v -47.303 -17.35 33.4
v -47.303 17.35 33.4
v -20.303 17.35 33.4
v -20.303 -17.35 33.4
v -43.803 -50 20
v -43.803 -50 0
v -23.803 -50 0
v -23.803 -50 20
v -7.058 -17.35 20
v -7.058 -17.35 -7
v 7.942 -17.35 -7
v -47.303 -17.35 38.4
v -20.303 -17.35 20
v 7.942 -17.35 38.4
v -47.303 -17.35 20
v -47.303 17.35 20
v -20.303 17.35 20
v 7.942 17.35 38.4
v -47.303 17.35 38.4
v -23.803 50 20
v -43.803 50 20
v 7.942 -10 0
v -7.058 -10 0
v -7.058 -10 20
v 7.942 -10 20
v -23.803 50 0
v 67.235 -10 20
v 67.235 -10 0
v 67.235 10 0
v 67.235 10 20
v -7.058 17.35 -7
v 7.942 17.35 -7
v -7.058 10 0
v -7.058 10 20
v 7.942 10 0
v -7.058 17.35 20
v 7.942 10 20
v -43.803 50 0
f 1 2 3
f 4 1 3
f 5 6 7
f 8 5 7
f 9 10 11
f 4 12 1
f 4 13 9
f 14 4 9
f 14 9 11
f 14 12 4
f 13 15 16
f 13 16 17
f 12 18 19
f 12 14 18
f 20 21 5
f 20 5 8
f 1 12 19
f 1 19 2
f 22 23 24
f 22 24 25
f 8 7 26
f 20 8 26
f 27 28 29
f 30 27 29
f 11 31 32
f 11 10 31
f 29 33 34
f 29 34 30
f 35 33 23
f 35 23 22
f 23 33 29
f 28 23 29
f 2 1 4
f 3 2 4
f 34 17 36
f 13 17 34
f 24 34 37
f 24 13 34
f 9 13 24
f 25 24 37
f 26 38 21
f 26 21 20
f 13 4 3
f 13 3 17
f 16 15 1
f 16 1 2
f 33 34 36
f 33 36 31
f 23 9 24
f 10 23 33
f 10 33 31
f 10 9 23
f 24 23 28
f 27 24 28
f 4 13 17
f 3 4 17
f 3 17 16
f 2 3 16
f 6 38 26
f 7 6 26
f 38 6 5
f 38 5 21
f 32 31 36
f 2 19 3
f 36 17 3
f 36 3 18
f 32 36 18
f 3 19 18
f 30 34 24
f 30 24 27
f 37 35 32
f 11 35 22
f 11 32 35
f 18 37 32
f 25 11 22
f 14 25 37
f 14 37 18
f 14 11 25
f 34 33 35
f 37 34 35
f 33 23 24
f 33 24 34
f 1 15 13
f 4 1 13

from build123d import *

# Parameters (mm, degrees)
F0_W          = 20
F0_H          = 100
F1_DEPTH      = 20
F0_W_2        = 74.2924562655
F0_H_2        = 20
F2_W          = 3.5
F2_H          = 34.7
F2_W_2        = 20
F3_DEPTH      = 13.4
F5_DEPTH      = 17.35
F5_DEPTH_BACK = 17.35


with BuildPart() as f1:
    # F0 (on Top) → F1 (new body)
    with BuildSketch(Plane.XY):
        with Locations((-33.8030671701, 0)):
            Rectangle(F0_W, F0_H)
    extrude(amount=F1_DEPTH)


with BuildPart() as f1b:
    # F0 (on Top) → F1, piece 2 (new body)
    with BuildSketch(Plane.XY):
        with Locations((30.0884444732, 0)):
            Rectangle(F0_W_2, F0_H_2)
    extrude(amount=F1_DEPTH)


with BuildPart() as f3:
    # F2 (on face) → F3 (new body)
    with BuildSketch(Plane.XY.offset(20)):
        with Locations((-45.5530671701, 0)):
            Rectangle(F2_W, F2_H)
        with Locations((-33.8030671701, 0)):
            Rectangle(F2_W_2, F2_H)
        with Locations((-22.0530671701, 0)):
            Rectangle(F2_W, F2_H)
    extrude(amount=F3_DEPTH)


with BuildPart() as f5:
    # F4 (on Front) → F5 (new body, two sides)
    with BuildSketch(Plane.XZ) as f5_sk:
        Polygon((7.9422163405, 38.4), (-47.3030671701, 38.4), (-47.3030671701, 33.4), (-20.3030671701, 33.4), (-20.3030671701, 20), (-7.0577836595, 20), (-7.0577836595, -7), (7.9422163405, -7), align=None)
    extrude(amount=F5_DEPTH)
    extrude(f5_sk.sketch, amount=-F5_DEPTH_BACK)

    # F6: cut F1b
    add(f1b.part, mode=Mode.SUBTRACT)


solid = Compound([f1.part, f1b.part, f3.part, f5.part])
